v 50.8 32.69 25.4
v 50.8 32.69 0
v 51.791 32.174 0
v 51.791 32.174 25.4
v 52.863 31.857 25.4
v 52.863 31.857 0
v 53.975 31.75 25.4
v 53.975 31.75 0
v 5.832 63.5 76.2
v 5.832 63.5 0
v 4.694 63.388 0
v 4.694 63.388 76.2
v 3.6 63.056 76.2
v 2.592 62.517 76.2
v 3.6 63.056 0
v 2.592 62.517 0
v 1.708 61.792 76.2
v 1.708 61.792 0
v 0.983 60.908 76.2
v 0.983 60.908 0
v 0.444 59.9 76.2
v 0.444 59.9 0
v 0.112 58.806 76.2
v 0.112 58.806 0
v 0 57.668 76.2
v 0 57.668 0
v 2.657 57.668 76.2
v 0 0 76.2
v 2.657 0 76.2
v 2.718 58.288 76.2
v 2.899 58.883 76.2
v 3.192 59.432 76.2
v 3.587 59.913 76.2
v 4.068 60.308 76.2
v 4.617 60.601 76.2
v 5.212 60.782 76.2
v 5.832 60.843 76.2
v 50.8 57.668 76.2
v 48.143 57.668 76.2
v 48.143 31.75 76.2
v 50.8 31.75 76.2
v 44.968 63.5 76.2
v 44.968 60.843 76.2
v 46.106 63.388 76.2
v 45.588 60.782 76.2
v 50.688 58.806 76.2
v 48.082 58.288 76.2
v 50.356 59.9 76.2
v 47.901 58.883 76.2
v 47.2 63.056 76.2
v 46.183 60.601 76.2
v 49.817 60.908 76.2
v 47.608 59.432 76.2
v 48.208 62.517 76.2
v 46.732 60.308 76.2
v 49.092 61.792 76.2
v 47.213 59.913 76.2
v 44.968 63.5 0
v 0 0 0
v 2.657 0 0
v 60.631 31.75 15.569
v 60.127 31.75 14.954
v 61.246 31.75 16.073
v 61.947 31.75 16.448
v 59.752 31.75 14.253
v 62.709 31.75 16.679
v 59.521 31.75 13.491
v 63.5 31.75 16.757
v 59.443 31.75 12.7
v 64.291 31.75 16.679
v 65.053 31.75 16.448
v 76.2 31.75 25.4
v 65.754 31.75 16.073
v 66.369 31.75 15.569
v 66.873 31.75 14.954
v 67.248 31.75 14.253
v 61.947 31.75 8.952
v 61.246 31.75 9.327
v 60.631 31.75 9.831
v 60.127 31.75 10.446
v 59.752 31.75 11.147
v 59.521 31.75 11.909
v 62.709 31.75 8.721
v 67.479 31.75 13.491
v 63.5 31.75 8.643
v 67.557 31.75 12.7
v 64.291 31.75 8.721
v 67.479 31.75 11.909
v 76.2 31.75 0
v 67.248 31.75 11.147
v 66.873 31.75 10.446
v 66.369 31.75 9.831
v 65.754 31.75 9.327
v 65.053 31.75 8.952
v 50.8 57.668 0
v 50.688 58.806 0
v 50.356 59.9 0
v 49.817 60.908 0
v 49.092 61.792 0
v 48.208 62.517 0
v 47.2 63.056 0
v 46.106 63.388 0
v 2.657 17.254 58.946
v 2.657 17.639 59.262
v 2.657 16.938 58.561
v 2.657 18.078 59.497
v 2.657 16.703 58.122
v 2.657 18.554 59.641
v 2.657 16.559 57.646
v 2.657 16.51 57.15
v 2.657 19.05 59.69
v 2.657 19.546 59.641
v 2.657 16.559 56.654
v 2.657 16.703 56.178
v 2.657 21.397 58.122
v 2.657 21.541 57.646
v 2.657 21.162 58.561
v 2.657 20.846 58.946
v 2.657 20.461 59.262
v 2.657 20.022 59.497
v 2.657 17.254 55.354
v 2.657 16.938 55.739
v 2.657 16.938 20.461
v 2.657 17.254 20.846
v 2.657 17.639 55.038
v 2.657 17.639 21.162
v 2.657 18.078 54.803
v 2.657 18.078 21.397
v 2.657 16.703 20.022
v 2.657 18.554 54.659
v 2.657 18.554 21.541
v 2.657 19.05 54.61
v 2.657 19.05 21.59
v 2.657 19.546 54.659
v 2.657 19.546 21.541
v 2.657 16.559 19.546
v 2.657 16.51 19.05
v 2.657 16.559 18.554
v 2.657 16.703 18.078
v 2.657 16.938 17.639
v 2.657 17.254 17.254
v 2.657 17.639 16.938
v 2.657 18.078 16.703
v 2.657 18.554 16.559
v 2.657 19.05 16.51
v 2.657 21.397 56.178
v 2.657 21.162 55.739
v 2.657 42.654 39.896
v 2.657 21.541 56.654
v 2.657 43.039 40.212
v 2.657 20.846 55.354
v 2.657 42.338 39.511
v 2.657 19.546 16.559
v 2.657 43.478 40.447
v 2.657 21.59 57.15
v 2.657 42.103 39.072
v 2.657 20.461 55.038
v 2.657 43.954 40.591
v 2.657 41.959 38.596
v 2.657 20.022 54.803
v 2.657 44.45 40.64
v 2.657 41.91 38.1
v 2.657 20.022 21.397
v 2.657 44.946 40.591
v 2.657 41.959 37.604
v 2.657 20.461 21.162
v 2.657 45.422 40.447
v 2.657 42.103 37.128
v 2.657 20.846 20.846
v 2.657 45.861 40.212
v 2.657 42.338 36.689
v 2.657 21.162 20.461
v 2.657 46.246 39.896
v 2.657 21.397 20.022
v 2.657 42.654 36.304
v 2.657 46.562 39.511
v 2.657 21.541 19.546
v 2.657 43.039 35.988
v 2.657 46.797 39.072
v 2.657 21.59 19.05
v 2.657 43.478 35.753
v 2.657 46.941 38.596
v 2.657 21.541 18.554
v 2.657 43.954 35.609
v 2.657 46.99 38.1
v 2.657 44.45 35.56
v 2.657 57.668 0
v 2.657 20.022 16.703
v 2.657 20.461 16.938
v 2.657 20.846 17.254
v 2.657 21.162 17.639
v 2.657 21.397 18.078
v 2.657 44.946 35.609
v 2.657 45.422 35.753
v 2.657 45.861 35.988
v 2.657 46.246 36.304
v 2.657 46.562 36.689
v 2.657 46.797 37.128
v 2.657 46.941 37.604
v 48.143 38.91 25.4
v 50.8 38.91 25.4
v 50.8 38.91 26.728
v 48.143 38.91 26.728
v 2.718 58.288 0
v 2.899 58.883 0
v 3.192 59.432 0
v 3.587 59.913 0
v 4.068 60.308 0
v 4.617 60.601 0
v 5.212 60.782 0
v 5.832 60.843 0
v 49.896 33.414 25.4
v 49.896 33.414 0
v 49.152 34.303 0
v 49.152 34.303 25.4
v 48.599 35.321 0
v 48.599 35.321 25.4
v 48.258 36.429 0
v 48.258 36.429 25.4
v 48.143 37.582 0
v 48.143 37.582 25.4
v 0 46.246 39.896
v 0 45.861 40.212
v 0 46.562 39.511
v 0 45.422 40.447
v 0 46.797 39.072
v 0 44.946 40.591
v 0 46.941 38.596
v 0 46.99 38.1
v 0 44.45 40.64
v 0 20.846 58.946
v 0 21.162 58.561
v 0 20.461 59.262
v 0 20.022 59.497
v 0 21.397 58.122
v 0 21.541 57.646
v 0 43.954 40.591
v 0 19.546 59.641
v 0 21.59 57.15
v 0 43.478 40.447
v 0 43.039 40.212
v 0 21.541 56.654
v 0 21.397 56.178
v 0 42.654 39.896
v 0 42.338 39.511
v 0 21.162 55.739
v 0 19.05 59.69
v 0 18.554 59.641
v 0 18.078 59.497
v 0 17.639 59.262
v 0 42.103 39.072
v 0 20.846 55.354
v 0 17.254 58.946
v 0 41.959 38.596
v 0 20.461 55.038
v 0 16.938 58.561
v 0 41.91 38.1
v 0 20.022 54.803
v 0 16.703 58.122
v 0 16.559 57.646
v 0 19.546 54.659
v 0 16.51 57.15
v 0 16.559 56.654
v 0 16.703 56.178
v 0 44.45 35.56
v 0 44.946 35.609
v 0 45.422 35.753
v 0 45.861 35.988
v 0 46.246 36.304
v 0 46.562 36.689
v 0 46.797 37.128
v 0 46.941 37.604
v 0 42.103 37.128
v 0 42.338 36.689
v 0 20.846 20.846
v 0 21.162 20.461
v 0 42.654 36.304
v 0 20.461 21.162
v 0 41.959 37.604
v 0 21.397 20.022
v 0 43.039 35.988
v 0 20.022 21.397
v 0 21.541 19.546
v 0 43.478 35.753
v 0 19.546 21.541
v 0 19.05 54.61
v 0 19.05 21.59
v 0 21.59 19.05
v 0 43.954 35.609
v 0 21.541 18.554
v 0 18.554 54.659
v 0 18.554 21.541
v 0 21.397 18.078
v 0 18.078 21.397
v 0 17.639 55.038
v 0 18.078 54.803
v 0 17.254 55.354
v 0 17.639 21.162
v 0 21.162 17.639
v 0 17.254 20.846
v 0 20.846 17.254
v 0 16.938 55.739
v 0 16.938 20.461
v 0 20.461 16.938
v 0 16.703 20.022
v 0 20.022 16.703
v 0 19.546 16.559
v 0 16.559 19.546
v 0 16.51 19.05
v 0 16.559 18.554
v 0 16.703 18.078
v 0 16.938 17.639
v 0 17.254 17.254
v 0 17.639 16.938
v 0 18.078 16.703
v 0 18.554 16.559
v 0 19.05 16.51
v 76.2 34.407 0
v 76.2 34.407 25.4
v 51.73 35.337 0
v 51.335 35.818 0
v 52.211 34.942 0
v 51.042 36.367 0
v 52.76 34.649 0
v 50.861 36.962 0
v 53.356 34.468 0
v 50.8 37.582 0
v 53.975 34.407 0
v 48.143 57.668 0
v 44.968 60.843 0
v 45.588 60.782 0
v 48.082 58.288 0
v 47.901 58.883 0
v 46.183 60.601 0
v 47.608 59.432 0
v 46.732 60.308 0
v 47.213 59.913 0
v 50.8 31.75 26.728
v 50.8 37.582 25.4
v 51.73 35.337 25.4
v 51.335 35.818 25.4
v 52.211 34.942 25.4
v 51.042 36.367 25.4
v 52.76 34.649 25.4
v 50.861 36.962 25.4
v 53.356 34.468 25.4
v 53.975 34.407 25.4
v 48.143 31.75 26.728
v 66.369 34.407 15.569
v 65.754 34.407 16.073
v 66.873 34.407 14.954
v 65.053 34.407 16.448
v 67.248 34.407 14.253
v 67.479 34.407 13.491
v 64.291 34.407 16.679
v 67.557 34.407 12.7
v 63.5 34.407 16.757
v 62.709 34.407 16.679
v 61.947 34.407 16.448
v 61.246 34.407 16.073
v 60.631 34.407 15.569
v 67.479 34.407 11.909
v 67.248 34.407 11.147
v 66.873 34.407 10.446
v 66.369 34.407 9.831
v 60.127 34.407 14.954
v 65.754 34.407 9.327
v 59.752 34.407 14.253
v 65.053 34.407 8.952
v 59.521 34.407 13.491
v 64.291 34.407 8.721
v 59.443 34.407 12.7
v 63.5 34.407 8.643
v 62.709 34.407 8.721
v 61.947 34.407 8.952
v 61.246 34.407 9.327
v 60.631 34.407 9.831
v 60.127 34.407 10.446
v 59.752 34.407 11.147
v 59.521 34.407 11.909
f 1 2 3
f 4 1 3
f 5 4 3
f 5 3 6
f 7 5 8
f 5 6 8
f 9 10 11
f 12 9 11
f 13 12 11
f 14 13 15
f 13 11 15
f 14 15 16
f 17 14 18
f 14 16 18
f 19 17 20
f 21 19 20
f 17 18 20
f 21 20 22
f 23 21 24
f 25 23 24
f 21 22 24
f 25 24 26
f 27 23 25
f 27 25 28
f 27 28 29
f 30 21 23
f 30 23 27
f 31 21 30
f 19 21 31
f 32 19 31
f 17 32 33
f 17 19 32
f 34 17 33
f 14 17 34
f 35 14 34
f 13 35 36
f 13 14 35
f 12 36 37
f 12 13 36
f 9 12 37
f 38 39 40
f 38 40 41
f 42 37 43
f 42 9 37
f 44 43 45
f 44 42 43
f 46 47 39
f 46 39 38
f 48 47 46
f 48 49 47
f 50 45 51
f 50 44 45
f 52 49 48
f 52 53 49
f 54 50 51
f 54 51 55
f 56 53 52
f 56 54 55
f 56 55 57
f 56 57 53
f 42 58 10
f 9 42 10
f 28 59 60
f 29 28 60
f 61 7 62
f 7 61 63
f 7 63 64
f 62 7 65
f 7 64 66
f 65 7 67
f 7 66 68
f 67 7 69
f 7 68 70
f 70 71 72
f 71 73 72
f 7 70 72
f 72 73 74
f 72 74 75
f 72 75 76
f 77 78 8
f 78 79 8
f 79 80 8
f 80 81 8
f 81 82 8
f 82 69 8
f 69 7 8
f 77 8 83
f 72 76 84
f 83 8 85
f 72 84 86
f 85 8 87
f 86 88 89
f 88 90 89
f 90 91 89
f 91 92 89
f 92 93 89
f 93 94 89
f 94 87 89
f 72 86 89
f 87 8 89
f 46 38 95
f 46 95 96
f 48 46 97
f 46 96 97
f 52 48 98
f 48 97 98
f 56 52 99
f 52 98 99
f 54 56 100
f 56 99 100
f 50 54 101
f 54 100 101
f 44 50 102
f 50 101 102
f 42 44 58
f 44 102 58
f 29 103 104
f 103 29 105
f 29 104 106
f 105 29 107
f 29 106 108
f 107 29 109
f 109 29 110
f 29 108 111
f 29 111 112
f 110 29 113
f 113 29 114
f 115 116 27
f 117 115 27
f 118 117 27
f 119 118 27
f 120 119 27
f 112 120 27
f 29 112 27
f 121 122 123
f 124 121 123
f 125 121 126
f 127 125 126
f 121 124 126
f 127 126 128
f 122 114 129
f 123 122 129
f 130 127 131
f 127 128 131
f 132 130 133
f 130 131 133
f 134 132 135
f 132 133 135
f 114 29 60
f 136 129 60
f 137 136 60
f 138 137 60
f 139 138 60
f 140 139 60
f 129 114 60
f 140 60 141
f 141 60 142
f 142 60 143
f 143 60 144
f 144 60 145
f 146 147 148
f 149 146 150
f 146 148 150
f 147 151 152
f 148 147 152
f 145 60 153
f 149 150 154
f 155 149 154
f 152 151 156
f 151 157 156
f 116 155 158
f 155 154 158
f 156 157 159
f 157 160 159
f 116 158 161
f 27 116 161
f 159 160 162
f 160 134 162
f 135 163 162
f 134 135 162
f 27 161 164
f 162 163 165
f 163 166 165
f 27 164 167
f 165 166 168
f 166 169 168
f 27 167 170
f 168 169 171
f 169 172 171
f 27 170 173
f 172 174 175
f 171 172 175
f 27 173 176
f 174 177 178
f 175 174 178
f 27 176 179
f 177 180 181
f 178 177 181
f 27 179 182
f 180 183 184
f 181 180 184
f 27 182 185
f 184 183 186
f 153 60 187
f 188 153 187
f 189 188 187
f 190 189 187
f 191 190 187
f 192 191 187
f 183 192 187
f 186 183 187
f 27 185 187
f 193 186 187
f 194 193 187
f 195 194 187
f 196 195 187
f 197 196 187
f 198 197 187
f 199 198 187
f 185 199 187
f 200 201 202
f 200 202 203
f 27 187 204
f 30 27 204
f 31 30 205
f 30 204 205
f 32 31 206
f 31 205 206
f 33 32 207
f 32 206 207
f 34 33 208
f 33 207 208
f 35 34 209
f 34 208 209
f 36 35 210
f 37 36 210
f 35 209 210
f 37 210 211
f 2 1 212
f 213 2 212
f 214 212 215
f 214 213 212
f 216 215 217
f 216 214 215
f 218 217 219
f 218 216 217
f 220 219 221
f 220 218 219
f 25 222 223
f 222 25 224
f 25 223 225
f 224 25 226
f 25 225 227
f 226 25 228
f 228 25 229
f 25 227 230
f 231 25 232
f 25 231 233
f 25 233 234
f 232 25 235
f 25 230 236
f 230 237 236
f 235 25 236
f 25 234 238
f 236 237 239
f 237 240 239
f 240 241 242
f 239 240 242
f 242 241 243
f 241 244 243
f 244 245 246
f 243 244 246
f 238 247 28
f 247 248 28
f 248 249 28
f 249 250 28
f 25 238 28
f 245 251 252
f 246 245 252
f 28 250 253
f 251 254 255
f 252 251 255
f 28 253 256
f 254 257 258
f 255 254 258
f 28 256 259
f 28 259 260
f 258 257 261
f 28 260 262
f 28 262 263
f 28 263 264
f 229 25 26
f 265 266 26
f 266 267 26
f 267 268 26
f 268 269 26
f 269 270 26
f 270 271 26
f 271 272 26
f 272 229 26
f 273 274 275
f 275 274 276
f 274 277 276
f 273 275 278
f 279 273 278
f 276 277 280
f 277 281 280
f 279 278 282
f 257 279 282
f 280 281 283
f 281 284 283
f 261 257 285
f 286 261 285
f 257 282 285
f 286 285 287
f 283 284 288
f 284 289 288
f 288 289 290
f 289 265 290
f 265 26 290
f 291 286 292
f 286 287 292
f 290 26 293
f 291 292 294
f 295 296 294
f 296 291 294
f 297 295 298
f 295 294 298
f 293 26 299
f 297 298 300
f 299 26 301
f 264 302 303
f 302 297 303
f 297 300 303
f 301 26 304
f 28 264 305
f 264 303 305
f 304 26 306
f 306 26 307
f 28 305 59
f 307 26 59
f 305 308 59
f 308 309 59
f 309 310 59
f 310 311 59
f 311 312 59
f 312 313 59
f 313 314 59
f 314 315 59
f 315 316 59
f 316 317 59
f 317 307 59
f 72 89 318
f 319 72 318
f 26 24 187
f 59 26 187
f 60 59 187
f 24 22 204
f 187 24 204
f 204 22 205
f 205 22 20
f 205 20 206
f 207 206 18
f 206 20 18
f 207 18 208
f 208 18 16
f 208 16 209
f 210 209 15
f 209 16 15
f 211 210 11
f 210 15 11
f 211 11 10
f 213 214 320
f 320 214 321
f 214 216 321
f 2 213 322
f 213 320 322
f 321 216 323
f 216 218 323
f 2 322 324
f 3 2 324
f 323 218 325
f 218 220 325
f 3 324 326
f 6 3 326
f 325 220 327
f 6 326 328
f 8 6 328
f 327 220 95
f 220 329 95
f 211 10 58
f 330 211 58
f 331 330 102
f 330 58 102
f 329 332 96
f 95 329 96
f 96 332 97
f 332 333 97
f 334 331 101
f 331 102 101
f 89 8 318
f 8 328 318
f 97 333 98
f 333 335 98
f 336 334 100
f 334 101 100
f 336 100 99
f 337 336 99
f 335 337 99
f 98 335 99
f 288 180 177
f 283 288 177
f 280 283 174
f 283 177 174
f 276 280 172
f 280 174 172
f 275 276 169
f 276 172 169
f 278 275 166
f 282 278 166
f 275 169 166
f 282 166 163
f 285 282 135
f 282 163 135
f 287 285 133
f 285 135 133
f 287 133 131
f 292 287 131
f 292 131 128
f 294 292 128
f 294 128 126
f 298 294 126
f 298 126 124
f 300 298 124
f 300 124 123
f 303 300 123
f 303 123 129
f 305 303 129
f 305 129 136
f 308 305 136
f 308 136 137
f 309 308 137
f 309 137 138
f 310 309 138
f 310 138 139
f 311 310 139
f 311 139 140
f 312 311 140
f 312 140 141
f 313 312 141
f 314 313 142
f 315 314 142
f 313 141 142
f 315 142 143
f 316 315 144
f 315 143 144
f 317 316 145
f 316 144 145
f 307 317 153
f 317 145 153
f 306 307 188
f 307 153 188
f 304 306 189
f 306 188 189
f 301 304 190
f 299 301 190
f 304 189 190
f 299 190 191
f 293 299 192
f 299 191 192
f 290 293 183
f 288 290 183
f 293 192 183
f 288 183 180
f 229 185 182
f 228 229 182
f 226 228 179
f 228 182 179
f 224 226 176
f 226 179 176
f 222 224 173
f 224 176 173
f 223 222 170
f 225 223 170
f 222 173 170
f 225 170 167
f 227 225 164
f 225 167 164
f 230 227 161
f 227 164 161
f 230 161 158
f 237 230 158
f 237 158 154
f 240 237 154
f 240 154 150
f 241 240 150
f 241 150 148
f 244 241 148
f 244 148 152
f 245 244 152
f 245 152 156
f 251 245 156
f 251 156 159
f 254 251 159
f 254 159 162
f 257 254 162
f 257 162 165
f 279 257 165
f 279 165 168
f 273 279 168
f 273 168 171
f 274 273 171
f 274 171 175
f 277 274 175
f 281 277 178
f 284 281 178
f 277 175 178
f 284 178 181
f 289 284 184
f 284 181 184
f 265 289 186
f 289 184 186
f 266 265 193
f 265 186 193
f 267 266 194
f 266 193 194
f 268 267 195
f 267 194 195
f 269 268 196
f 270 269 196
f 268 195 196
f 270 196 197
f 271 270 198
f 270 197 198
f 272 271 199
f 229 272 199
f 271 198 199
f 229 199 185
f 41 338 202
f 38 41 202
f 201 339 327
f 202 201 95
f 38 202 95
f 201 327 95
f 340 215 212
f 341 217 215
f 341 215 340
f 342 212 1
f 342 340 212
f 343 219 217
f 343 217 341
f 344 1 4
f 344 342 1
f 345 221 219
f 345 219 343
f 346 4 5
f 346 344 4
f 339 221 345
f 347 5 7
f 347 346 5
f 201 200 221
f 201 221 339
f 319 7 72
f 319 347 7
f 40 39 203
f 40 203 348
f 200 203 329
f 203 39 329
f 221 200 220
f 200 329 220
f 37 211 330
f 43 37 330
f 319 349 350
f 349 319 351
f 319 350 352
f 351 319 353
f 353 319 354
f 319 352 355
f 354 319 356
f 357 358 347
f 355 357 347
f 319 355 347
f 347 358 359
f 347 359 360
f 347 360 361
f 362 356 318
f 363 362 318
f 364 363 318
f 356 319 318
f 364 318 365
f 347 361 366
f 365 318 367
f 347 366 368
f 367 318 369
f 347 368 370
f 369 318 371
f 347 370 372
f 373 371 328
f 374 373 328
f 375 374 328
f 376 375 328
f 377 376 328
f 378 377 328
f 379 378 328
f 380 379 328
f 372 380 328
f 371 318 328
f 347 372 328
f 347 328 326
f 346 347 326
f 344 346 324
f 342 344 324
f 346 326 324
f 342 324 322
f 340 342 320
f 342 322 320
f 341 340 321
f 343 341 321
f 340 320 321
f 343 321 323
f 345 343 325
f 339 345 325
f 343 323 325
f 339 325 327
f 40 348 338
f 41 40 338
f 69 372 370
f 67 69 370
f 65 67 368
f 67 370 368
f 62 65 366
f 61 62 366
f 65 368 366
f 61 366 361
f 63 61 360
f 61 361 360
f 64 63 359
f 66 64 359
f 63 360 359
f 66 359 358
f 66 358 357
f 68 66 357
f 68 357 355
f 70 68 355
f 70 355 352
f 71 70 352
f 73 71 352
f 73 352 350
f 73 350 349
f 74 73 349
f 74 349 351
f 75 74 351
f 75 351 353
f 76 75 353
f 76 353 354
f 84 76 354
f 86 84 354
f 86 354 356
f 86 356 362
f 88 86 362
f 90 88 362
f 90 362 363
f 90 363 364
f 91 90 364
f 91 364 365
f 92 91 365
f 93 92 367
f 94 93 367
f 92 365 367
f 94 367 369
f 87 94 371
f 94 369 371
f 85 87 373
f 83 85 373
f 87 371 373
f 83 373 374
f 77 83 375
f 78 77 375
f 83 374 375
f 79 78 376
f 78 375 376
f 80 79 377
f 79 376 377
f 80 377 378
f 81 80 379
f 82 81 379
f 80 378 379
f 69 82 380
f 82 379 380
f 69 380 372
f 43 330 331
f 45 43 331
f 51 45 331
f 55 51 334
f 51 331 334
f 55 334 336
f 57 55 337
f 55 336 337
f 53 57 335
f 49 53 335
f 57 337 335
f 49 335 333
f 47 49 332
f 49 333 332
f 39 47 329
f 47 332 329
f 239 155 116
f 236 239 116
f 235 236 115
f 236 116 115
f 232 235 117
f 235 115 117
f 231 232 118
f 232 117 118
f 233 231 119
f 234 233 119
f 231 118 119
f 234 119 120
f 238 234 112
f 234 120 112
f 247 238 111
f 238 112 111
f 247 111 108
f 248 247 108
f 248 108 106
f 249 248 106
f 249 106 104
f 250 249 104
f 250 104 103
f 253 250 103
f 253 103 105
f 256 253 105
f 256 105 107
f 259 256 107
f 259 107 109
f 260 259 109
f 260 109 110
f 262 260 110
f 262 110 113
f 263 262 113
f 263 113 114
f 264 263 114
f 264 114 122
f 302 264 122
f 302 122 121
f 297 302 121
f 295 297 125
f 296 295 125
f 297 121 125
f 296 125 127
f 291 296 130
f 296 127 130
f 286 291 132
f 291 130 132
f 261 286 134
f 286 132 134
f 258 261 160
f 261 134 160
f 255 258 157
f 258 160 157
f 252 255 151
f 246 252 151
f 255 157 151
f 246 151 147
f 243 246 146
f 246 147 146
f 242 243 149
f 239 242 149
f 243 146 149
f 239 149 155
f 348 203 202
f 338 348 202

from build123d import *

# Parameters (mm, degrees)
BASE_FLANGE1_DEPTH    = 76.2
SKETCH5_R             = 2.54
CUT_EXTRUDE1_DEPTH    = 111.256309818
MITER_FLANGE1_DEPTH   = 26.72842
MITER_START           = 25.4
MITER_FLANGE1_2_DEPTH = 1.32842
MITER_FLANGE1_3_DEPTH = 25.4
SKETCH7_R             = 4.056943783
CUT_EXTRUDE2_DEPTH    = 114.122546996


# Read off the part's stored shape, not the designer's step: Miter Flange1
# Sheet-metal steps are written as plain solids
with BuildPart() as part:
    # Sketch3 → Base-Flange1 (new body)
    with BuildSketch(Plane.XY):
        with BuildLine():
            Line((50.8, 31.75), (50.8, 57.66816))
            ThreePointArc((50.8, 57.66816), (49.091893611, 61.791893611), (44.96816, 63.5))
            Line((44.96816, 63.5), (5.83184, 63.5))
            ThreePointArc((5.83184, 63.5), (1.708106389, 61.791893611), (0, 57.66816))
            Line((0, 57.66816), (0, 0))
            Line((0, 0), (2.65684, 0))
            Line((2.65684, 0), (2.65684, 57.66816))
            ThreePointArc((2.65684, 57.66816), (3.58677597, 59.91322403), (5.83184, 60.84316))
            Line((5.83184, 60.84316), (44.96816, 60.84316))
            ThreePointArc((44.96816, 60.84316), (47.21322403, 59.91322403), (48.14316, 57.66816))
            Line((48.14316, 57.66816), (48.14316, 31.75))
            Line((48.14316, 31.75), (50.8, 31.75))
        make_face()
    extrude(amount=BASE_FLANGE1_DEPTH)

    # Sketch5 → Cut-Extrude1 (cut, through all)
    with BuildSketch(Plane(origin=(2.65684, 0, 0), x_dir=(0, 0, -1), z_dir=(1, 0, 0))):
        with Locations(Location((-57.15, 19.05, 0), (0, 0, 90))):
            Circle(SKETCH5_R)
        with Locations(Location((-38.1, 44.45, 0), (0, 0, 90))):
            Circle(SKETCH5_R)
        with Locations(Location((-19.05, 19.05, 0), (0, 0, 90))):
            Circle(SKETCH5_R)
    extrude(amount=-CUT_EXTRUDE1_DEPTH, mode=Mode.SUBTRACT)

    # Miter Flange1 outline → Miter Flange1 (cut)
    with BuildSketch(Plane.XY):
        with BuildLine():
            Line((50.8, 31.75), (50.8, 32.690037389))
            ThreePointArc((50.8, 32.690037389), (48.850234162, 34.798472814), (48.14316, 37.58184))
            Line((48.14316, 37.58184), (48.14316, 31.75))
            Line((48.14316, 31.75), (50.8, 31.75))
        make_face()
    extrude(amount=MITER_FLANGE1_DEPTH, mode=Mode.SUBTRACT)

    # Miter Flange1 2 outline → Miter Flange1 2 (cut)
    with BuildSketch(Plane.XY.offset(MITER_START)):
        with BuildLine():
            ThreePointArc((48.14316, 37.58184), (48.850234162, 34.798472814), (50.8, 32.690037389))
            Line((50.8, 32.690037389), (50.8, 38.91026))
            Line((50.8, 38.91026), (48.14316, 38.91026))
            Line((48.14316, 38.91026), (48.14316, 37.58184))
        make_face()
    extrude(amount=MITER_FLANGE1_2_DEPTH, mode=Mode.SUBTRACT)

    # Miter Flange1 3 outline → Miter Flange1 3 (add)
    with BuildSketch(Plane.XY):
        with BuildLine():
            Line((53.975, 31.75), (76.2, 31.75))
            Line((76.2, 31.75), (76.2, 34.40684))
            Line((76.2, 34.40684), (53.975, 34.40684))
            ThreePointArc((53.975, 34.40684), (51.72993597, 35.33677597), (50.8, 37.58184))
            Line((50.8, 37.58184), (50.8, 32.690037389))
            ThreePointArc((50.8, 32.690037389), (52.319381136, 31.989945512), (53.975, 31.75))
        make_face()
    extrude(amount=MITER_FLANGE1_3_DEPTH)

    # Sketch7 → Cut-Extrude2 (cut, through all)
    with BuildSketch(Plane(origin=(0, 34.40684, 0), x_dir=(-1, 0, 0), z_dir=(0, 1, 0))):
        with Locations((-63.5, 12.7)):
            Circle(SKETCH7_R)
    extrude(amount=-CUT_EXTRUDE2_DEPTH, mode=Mode.SUBTRACT)


solid = part.part
